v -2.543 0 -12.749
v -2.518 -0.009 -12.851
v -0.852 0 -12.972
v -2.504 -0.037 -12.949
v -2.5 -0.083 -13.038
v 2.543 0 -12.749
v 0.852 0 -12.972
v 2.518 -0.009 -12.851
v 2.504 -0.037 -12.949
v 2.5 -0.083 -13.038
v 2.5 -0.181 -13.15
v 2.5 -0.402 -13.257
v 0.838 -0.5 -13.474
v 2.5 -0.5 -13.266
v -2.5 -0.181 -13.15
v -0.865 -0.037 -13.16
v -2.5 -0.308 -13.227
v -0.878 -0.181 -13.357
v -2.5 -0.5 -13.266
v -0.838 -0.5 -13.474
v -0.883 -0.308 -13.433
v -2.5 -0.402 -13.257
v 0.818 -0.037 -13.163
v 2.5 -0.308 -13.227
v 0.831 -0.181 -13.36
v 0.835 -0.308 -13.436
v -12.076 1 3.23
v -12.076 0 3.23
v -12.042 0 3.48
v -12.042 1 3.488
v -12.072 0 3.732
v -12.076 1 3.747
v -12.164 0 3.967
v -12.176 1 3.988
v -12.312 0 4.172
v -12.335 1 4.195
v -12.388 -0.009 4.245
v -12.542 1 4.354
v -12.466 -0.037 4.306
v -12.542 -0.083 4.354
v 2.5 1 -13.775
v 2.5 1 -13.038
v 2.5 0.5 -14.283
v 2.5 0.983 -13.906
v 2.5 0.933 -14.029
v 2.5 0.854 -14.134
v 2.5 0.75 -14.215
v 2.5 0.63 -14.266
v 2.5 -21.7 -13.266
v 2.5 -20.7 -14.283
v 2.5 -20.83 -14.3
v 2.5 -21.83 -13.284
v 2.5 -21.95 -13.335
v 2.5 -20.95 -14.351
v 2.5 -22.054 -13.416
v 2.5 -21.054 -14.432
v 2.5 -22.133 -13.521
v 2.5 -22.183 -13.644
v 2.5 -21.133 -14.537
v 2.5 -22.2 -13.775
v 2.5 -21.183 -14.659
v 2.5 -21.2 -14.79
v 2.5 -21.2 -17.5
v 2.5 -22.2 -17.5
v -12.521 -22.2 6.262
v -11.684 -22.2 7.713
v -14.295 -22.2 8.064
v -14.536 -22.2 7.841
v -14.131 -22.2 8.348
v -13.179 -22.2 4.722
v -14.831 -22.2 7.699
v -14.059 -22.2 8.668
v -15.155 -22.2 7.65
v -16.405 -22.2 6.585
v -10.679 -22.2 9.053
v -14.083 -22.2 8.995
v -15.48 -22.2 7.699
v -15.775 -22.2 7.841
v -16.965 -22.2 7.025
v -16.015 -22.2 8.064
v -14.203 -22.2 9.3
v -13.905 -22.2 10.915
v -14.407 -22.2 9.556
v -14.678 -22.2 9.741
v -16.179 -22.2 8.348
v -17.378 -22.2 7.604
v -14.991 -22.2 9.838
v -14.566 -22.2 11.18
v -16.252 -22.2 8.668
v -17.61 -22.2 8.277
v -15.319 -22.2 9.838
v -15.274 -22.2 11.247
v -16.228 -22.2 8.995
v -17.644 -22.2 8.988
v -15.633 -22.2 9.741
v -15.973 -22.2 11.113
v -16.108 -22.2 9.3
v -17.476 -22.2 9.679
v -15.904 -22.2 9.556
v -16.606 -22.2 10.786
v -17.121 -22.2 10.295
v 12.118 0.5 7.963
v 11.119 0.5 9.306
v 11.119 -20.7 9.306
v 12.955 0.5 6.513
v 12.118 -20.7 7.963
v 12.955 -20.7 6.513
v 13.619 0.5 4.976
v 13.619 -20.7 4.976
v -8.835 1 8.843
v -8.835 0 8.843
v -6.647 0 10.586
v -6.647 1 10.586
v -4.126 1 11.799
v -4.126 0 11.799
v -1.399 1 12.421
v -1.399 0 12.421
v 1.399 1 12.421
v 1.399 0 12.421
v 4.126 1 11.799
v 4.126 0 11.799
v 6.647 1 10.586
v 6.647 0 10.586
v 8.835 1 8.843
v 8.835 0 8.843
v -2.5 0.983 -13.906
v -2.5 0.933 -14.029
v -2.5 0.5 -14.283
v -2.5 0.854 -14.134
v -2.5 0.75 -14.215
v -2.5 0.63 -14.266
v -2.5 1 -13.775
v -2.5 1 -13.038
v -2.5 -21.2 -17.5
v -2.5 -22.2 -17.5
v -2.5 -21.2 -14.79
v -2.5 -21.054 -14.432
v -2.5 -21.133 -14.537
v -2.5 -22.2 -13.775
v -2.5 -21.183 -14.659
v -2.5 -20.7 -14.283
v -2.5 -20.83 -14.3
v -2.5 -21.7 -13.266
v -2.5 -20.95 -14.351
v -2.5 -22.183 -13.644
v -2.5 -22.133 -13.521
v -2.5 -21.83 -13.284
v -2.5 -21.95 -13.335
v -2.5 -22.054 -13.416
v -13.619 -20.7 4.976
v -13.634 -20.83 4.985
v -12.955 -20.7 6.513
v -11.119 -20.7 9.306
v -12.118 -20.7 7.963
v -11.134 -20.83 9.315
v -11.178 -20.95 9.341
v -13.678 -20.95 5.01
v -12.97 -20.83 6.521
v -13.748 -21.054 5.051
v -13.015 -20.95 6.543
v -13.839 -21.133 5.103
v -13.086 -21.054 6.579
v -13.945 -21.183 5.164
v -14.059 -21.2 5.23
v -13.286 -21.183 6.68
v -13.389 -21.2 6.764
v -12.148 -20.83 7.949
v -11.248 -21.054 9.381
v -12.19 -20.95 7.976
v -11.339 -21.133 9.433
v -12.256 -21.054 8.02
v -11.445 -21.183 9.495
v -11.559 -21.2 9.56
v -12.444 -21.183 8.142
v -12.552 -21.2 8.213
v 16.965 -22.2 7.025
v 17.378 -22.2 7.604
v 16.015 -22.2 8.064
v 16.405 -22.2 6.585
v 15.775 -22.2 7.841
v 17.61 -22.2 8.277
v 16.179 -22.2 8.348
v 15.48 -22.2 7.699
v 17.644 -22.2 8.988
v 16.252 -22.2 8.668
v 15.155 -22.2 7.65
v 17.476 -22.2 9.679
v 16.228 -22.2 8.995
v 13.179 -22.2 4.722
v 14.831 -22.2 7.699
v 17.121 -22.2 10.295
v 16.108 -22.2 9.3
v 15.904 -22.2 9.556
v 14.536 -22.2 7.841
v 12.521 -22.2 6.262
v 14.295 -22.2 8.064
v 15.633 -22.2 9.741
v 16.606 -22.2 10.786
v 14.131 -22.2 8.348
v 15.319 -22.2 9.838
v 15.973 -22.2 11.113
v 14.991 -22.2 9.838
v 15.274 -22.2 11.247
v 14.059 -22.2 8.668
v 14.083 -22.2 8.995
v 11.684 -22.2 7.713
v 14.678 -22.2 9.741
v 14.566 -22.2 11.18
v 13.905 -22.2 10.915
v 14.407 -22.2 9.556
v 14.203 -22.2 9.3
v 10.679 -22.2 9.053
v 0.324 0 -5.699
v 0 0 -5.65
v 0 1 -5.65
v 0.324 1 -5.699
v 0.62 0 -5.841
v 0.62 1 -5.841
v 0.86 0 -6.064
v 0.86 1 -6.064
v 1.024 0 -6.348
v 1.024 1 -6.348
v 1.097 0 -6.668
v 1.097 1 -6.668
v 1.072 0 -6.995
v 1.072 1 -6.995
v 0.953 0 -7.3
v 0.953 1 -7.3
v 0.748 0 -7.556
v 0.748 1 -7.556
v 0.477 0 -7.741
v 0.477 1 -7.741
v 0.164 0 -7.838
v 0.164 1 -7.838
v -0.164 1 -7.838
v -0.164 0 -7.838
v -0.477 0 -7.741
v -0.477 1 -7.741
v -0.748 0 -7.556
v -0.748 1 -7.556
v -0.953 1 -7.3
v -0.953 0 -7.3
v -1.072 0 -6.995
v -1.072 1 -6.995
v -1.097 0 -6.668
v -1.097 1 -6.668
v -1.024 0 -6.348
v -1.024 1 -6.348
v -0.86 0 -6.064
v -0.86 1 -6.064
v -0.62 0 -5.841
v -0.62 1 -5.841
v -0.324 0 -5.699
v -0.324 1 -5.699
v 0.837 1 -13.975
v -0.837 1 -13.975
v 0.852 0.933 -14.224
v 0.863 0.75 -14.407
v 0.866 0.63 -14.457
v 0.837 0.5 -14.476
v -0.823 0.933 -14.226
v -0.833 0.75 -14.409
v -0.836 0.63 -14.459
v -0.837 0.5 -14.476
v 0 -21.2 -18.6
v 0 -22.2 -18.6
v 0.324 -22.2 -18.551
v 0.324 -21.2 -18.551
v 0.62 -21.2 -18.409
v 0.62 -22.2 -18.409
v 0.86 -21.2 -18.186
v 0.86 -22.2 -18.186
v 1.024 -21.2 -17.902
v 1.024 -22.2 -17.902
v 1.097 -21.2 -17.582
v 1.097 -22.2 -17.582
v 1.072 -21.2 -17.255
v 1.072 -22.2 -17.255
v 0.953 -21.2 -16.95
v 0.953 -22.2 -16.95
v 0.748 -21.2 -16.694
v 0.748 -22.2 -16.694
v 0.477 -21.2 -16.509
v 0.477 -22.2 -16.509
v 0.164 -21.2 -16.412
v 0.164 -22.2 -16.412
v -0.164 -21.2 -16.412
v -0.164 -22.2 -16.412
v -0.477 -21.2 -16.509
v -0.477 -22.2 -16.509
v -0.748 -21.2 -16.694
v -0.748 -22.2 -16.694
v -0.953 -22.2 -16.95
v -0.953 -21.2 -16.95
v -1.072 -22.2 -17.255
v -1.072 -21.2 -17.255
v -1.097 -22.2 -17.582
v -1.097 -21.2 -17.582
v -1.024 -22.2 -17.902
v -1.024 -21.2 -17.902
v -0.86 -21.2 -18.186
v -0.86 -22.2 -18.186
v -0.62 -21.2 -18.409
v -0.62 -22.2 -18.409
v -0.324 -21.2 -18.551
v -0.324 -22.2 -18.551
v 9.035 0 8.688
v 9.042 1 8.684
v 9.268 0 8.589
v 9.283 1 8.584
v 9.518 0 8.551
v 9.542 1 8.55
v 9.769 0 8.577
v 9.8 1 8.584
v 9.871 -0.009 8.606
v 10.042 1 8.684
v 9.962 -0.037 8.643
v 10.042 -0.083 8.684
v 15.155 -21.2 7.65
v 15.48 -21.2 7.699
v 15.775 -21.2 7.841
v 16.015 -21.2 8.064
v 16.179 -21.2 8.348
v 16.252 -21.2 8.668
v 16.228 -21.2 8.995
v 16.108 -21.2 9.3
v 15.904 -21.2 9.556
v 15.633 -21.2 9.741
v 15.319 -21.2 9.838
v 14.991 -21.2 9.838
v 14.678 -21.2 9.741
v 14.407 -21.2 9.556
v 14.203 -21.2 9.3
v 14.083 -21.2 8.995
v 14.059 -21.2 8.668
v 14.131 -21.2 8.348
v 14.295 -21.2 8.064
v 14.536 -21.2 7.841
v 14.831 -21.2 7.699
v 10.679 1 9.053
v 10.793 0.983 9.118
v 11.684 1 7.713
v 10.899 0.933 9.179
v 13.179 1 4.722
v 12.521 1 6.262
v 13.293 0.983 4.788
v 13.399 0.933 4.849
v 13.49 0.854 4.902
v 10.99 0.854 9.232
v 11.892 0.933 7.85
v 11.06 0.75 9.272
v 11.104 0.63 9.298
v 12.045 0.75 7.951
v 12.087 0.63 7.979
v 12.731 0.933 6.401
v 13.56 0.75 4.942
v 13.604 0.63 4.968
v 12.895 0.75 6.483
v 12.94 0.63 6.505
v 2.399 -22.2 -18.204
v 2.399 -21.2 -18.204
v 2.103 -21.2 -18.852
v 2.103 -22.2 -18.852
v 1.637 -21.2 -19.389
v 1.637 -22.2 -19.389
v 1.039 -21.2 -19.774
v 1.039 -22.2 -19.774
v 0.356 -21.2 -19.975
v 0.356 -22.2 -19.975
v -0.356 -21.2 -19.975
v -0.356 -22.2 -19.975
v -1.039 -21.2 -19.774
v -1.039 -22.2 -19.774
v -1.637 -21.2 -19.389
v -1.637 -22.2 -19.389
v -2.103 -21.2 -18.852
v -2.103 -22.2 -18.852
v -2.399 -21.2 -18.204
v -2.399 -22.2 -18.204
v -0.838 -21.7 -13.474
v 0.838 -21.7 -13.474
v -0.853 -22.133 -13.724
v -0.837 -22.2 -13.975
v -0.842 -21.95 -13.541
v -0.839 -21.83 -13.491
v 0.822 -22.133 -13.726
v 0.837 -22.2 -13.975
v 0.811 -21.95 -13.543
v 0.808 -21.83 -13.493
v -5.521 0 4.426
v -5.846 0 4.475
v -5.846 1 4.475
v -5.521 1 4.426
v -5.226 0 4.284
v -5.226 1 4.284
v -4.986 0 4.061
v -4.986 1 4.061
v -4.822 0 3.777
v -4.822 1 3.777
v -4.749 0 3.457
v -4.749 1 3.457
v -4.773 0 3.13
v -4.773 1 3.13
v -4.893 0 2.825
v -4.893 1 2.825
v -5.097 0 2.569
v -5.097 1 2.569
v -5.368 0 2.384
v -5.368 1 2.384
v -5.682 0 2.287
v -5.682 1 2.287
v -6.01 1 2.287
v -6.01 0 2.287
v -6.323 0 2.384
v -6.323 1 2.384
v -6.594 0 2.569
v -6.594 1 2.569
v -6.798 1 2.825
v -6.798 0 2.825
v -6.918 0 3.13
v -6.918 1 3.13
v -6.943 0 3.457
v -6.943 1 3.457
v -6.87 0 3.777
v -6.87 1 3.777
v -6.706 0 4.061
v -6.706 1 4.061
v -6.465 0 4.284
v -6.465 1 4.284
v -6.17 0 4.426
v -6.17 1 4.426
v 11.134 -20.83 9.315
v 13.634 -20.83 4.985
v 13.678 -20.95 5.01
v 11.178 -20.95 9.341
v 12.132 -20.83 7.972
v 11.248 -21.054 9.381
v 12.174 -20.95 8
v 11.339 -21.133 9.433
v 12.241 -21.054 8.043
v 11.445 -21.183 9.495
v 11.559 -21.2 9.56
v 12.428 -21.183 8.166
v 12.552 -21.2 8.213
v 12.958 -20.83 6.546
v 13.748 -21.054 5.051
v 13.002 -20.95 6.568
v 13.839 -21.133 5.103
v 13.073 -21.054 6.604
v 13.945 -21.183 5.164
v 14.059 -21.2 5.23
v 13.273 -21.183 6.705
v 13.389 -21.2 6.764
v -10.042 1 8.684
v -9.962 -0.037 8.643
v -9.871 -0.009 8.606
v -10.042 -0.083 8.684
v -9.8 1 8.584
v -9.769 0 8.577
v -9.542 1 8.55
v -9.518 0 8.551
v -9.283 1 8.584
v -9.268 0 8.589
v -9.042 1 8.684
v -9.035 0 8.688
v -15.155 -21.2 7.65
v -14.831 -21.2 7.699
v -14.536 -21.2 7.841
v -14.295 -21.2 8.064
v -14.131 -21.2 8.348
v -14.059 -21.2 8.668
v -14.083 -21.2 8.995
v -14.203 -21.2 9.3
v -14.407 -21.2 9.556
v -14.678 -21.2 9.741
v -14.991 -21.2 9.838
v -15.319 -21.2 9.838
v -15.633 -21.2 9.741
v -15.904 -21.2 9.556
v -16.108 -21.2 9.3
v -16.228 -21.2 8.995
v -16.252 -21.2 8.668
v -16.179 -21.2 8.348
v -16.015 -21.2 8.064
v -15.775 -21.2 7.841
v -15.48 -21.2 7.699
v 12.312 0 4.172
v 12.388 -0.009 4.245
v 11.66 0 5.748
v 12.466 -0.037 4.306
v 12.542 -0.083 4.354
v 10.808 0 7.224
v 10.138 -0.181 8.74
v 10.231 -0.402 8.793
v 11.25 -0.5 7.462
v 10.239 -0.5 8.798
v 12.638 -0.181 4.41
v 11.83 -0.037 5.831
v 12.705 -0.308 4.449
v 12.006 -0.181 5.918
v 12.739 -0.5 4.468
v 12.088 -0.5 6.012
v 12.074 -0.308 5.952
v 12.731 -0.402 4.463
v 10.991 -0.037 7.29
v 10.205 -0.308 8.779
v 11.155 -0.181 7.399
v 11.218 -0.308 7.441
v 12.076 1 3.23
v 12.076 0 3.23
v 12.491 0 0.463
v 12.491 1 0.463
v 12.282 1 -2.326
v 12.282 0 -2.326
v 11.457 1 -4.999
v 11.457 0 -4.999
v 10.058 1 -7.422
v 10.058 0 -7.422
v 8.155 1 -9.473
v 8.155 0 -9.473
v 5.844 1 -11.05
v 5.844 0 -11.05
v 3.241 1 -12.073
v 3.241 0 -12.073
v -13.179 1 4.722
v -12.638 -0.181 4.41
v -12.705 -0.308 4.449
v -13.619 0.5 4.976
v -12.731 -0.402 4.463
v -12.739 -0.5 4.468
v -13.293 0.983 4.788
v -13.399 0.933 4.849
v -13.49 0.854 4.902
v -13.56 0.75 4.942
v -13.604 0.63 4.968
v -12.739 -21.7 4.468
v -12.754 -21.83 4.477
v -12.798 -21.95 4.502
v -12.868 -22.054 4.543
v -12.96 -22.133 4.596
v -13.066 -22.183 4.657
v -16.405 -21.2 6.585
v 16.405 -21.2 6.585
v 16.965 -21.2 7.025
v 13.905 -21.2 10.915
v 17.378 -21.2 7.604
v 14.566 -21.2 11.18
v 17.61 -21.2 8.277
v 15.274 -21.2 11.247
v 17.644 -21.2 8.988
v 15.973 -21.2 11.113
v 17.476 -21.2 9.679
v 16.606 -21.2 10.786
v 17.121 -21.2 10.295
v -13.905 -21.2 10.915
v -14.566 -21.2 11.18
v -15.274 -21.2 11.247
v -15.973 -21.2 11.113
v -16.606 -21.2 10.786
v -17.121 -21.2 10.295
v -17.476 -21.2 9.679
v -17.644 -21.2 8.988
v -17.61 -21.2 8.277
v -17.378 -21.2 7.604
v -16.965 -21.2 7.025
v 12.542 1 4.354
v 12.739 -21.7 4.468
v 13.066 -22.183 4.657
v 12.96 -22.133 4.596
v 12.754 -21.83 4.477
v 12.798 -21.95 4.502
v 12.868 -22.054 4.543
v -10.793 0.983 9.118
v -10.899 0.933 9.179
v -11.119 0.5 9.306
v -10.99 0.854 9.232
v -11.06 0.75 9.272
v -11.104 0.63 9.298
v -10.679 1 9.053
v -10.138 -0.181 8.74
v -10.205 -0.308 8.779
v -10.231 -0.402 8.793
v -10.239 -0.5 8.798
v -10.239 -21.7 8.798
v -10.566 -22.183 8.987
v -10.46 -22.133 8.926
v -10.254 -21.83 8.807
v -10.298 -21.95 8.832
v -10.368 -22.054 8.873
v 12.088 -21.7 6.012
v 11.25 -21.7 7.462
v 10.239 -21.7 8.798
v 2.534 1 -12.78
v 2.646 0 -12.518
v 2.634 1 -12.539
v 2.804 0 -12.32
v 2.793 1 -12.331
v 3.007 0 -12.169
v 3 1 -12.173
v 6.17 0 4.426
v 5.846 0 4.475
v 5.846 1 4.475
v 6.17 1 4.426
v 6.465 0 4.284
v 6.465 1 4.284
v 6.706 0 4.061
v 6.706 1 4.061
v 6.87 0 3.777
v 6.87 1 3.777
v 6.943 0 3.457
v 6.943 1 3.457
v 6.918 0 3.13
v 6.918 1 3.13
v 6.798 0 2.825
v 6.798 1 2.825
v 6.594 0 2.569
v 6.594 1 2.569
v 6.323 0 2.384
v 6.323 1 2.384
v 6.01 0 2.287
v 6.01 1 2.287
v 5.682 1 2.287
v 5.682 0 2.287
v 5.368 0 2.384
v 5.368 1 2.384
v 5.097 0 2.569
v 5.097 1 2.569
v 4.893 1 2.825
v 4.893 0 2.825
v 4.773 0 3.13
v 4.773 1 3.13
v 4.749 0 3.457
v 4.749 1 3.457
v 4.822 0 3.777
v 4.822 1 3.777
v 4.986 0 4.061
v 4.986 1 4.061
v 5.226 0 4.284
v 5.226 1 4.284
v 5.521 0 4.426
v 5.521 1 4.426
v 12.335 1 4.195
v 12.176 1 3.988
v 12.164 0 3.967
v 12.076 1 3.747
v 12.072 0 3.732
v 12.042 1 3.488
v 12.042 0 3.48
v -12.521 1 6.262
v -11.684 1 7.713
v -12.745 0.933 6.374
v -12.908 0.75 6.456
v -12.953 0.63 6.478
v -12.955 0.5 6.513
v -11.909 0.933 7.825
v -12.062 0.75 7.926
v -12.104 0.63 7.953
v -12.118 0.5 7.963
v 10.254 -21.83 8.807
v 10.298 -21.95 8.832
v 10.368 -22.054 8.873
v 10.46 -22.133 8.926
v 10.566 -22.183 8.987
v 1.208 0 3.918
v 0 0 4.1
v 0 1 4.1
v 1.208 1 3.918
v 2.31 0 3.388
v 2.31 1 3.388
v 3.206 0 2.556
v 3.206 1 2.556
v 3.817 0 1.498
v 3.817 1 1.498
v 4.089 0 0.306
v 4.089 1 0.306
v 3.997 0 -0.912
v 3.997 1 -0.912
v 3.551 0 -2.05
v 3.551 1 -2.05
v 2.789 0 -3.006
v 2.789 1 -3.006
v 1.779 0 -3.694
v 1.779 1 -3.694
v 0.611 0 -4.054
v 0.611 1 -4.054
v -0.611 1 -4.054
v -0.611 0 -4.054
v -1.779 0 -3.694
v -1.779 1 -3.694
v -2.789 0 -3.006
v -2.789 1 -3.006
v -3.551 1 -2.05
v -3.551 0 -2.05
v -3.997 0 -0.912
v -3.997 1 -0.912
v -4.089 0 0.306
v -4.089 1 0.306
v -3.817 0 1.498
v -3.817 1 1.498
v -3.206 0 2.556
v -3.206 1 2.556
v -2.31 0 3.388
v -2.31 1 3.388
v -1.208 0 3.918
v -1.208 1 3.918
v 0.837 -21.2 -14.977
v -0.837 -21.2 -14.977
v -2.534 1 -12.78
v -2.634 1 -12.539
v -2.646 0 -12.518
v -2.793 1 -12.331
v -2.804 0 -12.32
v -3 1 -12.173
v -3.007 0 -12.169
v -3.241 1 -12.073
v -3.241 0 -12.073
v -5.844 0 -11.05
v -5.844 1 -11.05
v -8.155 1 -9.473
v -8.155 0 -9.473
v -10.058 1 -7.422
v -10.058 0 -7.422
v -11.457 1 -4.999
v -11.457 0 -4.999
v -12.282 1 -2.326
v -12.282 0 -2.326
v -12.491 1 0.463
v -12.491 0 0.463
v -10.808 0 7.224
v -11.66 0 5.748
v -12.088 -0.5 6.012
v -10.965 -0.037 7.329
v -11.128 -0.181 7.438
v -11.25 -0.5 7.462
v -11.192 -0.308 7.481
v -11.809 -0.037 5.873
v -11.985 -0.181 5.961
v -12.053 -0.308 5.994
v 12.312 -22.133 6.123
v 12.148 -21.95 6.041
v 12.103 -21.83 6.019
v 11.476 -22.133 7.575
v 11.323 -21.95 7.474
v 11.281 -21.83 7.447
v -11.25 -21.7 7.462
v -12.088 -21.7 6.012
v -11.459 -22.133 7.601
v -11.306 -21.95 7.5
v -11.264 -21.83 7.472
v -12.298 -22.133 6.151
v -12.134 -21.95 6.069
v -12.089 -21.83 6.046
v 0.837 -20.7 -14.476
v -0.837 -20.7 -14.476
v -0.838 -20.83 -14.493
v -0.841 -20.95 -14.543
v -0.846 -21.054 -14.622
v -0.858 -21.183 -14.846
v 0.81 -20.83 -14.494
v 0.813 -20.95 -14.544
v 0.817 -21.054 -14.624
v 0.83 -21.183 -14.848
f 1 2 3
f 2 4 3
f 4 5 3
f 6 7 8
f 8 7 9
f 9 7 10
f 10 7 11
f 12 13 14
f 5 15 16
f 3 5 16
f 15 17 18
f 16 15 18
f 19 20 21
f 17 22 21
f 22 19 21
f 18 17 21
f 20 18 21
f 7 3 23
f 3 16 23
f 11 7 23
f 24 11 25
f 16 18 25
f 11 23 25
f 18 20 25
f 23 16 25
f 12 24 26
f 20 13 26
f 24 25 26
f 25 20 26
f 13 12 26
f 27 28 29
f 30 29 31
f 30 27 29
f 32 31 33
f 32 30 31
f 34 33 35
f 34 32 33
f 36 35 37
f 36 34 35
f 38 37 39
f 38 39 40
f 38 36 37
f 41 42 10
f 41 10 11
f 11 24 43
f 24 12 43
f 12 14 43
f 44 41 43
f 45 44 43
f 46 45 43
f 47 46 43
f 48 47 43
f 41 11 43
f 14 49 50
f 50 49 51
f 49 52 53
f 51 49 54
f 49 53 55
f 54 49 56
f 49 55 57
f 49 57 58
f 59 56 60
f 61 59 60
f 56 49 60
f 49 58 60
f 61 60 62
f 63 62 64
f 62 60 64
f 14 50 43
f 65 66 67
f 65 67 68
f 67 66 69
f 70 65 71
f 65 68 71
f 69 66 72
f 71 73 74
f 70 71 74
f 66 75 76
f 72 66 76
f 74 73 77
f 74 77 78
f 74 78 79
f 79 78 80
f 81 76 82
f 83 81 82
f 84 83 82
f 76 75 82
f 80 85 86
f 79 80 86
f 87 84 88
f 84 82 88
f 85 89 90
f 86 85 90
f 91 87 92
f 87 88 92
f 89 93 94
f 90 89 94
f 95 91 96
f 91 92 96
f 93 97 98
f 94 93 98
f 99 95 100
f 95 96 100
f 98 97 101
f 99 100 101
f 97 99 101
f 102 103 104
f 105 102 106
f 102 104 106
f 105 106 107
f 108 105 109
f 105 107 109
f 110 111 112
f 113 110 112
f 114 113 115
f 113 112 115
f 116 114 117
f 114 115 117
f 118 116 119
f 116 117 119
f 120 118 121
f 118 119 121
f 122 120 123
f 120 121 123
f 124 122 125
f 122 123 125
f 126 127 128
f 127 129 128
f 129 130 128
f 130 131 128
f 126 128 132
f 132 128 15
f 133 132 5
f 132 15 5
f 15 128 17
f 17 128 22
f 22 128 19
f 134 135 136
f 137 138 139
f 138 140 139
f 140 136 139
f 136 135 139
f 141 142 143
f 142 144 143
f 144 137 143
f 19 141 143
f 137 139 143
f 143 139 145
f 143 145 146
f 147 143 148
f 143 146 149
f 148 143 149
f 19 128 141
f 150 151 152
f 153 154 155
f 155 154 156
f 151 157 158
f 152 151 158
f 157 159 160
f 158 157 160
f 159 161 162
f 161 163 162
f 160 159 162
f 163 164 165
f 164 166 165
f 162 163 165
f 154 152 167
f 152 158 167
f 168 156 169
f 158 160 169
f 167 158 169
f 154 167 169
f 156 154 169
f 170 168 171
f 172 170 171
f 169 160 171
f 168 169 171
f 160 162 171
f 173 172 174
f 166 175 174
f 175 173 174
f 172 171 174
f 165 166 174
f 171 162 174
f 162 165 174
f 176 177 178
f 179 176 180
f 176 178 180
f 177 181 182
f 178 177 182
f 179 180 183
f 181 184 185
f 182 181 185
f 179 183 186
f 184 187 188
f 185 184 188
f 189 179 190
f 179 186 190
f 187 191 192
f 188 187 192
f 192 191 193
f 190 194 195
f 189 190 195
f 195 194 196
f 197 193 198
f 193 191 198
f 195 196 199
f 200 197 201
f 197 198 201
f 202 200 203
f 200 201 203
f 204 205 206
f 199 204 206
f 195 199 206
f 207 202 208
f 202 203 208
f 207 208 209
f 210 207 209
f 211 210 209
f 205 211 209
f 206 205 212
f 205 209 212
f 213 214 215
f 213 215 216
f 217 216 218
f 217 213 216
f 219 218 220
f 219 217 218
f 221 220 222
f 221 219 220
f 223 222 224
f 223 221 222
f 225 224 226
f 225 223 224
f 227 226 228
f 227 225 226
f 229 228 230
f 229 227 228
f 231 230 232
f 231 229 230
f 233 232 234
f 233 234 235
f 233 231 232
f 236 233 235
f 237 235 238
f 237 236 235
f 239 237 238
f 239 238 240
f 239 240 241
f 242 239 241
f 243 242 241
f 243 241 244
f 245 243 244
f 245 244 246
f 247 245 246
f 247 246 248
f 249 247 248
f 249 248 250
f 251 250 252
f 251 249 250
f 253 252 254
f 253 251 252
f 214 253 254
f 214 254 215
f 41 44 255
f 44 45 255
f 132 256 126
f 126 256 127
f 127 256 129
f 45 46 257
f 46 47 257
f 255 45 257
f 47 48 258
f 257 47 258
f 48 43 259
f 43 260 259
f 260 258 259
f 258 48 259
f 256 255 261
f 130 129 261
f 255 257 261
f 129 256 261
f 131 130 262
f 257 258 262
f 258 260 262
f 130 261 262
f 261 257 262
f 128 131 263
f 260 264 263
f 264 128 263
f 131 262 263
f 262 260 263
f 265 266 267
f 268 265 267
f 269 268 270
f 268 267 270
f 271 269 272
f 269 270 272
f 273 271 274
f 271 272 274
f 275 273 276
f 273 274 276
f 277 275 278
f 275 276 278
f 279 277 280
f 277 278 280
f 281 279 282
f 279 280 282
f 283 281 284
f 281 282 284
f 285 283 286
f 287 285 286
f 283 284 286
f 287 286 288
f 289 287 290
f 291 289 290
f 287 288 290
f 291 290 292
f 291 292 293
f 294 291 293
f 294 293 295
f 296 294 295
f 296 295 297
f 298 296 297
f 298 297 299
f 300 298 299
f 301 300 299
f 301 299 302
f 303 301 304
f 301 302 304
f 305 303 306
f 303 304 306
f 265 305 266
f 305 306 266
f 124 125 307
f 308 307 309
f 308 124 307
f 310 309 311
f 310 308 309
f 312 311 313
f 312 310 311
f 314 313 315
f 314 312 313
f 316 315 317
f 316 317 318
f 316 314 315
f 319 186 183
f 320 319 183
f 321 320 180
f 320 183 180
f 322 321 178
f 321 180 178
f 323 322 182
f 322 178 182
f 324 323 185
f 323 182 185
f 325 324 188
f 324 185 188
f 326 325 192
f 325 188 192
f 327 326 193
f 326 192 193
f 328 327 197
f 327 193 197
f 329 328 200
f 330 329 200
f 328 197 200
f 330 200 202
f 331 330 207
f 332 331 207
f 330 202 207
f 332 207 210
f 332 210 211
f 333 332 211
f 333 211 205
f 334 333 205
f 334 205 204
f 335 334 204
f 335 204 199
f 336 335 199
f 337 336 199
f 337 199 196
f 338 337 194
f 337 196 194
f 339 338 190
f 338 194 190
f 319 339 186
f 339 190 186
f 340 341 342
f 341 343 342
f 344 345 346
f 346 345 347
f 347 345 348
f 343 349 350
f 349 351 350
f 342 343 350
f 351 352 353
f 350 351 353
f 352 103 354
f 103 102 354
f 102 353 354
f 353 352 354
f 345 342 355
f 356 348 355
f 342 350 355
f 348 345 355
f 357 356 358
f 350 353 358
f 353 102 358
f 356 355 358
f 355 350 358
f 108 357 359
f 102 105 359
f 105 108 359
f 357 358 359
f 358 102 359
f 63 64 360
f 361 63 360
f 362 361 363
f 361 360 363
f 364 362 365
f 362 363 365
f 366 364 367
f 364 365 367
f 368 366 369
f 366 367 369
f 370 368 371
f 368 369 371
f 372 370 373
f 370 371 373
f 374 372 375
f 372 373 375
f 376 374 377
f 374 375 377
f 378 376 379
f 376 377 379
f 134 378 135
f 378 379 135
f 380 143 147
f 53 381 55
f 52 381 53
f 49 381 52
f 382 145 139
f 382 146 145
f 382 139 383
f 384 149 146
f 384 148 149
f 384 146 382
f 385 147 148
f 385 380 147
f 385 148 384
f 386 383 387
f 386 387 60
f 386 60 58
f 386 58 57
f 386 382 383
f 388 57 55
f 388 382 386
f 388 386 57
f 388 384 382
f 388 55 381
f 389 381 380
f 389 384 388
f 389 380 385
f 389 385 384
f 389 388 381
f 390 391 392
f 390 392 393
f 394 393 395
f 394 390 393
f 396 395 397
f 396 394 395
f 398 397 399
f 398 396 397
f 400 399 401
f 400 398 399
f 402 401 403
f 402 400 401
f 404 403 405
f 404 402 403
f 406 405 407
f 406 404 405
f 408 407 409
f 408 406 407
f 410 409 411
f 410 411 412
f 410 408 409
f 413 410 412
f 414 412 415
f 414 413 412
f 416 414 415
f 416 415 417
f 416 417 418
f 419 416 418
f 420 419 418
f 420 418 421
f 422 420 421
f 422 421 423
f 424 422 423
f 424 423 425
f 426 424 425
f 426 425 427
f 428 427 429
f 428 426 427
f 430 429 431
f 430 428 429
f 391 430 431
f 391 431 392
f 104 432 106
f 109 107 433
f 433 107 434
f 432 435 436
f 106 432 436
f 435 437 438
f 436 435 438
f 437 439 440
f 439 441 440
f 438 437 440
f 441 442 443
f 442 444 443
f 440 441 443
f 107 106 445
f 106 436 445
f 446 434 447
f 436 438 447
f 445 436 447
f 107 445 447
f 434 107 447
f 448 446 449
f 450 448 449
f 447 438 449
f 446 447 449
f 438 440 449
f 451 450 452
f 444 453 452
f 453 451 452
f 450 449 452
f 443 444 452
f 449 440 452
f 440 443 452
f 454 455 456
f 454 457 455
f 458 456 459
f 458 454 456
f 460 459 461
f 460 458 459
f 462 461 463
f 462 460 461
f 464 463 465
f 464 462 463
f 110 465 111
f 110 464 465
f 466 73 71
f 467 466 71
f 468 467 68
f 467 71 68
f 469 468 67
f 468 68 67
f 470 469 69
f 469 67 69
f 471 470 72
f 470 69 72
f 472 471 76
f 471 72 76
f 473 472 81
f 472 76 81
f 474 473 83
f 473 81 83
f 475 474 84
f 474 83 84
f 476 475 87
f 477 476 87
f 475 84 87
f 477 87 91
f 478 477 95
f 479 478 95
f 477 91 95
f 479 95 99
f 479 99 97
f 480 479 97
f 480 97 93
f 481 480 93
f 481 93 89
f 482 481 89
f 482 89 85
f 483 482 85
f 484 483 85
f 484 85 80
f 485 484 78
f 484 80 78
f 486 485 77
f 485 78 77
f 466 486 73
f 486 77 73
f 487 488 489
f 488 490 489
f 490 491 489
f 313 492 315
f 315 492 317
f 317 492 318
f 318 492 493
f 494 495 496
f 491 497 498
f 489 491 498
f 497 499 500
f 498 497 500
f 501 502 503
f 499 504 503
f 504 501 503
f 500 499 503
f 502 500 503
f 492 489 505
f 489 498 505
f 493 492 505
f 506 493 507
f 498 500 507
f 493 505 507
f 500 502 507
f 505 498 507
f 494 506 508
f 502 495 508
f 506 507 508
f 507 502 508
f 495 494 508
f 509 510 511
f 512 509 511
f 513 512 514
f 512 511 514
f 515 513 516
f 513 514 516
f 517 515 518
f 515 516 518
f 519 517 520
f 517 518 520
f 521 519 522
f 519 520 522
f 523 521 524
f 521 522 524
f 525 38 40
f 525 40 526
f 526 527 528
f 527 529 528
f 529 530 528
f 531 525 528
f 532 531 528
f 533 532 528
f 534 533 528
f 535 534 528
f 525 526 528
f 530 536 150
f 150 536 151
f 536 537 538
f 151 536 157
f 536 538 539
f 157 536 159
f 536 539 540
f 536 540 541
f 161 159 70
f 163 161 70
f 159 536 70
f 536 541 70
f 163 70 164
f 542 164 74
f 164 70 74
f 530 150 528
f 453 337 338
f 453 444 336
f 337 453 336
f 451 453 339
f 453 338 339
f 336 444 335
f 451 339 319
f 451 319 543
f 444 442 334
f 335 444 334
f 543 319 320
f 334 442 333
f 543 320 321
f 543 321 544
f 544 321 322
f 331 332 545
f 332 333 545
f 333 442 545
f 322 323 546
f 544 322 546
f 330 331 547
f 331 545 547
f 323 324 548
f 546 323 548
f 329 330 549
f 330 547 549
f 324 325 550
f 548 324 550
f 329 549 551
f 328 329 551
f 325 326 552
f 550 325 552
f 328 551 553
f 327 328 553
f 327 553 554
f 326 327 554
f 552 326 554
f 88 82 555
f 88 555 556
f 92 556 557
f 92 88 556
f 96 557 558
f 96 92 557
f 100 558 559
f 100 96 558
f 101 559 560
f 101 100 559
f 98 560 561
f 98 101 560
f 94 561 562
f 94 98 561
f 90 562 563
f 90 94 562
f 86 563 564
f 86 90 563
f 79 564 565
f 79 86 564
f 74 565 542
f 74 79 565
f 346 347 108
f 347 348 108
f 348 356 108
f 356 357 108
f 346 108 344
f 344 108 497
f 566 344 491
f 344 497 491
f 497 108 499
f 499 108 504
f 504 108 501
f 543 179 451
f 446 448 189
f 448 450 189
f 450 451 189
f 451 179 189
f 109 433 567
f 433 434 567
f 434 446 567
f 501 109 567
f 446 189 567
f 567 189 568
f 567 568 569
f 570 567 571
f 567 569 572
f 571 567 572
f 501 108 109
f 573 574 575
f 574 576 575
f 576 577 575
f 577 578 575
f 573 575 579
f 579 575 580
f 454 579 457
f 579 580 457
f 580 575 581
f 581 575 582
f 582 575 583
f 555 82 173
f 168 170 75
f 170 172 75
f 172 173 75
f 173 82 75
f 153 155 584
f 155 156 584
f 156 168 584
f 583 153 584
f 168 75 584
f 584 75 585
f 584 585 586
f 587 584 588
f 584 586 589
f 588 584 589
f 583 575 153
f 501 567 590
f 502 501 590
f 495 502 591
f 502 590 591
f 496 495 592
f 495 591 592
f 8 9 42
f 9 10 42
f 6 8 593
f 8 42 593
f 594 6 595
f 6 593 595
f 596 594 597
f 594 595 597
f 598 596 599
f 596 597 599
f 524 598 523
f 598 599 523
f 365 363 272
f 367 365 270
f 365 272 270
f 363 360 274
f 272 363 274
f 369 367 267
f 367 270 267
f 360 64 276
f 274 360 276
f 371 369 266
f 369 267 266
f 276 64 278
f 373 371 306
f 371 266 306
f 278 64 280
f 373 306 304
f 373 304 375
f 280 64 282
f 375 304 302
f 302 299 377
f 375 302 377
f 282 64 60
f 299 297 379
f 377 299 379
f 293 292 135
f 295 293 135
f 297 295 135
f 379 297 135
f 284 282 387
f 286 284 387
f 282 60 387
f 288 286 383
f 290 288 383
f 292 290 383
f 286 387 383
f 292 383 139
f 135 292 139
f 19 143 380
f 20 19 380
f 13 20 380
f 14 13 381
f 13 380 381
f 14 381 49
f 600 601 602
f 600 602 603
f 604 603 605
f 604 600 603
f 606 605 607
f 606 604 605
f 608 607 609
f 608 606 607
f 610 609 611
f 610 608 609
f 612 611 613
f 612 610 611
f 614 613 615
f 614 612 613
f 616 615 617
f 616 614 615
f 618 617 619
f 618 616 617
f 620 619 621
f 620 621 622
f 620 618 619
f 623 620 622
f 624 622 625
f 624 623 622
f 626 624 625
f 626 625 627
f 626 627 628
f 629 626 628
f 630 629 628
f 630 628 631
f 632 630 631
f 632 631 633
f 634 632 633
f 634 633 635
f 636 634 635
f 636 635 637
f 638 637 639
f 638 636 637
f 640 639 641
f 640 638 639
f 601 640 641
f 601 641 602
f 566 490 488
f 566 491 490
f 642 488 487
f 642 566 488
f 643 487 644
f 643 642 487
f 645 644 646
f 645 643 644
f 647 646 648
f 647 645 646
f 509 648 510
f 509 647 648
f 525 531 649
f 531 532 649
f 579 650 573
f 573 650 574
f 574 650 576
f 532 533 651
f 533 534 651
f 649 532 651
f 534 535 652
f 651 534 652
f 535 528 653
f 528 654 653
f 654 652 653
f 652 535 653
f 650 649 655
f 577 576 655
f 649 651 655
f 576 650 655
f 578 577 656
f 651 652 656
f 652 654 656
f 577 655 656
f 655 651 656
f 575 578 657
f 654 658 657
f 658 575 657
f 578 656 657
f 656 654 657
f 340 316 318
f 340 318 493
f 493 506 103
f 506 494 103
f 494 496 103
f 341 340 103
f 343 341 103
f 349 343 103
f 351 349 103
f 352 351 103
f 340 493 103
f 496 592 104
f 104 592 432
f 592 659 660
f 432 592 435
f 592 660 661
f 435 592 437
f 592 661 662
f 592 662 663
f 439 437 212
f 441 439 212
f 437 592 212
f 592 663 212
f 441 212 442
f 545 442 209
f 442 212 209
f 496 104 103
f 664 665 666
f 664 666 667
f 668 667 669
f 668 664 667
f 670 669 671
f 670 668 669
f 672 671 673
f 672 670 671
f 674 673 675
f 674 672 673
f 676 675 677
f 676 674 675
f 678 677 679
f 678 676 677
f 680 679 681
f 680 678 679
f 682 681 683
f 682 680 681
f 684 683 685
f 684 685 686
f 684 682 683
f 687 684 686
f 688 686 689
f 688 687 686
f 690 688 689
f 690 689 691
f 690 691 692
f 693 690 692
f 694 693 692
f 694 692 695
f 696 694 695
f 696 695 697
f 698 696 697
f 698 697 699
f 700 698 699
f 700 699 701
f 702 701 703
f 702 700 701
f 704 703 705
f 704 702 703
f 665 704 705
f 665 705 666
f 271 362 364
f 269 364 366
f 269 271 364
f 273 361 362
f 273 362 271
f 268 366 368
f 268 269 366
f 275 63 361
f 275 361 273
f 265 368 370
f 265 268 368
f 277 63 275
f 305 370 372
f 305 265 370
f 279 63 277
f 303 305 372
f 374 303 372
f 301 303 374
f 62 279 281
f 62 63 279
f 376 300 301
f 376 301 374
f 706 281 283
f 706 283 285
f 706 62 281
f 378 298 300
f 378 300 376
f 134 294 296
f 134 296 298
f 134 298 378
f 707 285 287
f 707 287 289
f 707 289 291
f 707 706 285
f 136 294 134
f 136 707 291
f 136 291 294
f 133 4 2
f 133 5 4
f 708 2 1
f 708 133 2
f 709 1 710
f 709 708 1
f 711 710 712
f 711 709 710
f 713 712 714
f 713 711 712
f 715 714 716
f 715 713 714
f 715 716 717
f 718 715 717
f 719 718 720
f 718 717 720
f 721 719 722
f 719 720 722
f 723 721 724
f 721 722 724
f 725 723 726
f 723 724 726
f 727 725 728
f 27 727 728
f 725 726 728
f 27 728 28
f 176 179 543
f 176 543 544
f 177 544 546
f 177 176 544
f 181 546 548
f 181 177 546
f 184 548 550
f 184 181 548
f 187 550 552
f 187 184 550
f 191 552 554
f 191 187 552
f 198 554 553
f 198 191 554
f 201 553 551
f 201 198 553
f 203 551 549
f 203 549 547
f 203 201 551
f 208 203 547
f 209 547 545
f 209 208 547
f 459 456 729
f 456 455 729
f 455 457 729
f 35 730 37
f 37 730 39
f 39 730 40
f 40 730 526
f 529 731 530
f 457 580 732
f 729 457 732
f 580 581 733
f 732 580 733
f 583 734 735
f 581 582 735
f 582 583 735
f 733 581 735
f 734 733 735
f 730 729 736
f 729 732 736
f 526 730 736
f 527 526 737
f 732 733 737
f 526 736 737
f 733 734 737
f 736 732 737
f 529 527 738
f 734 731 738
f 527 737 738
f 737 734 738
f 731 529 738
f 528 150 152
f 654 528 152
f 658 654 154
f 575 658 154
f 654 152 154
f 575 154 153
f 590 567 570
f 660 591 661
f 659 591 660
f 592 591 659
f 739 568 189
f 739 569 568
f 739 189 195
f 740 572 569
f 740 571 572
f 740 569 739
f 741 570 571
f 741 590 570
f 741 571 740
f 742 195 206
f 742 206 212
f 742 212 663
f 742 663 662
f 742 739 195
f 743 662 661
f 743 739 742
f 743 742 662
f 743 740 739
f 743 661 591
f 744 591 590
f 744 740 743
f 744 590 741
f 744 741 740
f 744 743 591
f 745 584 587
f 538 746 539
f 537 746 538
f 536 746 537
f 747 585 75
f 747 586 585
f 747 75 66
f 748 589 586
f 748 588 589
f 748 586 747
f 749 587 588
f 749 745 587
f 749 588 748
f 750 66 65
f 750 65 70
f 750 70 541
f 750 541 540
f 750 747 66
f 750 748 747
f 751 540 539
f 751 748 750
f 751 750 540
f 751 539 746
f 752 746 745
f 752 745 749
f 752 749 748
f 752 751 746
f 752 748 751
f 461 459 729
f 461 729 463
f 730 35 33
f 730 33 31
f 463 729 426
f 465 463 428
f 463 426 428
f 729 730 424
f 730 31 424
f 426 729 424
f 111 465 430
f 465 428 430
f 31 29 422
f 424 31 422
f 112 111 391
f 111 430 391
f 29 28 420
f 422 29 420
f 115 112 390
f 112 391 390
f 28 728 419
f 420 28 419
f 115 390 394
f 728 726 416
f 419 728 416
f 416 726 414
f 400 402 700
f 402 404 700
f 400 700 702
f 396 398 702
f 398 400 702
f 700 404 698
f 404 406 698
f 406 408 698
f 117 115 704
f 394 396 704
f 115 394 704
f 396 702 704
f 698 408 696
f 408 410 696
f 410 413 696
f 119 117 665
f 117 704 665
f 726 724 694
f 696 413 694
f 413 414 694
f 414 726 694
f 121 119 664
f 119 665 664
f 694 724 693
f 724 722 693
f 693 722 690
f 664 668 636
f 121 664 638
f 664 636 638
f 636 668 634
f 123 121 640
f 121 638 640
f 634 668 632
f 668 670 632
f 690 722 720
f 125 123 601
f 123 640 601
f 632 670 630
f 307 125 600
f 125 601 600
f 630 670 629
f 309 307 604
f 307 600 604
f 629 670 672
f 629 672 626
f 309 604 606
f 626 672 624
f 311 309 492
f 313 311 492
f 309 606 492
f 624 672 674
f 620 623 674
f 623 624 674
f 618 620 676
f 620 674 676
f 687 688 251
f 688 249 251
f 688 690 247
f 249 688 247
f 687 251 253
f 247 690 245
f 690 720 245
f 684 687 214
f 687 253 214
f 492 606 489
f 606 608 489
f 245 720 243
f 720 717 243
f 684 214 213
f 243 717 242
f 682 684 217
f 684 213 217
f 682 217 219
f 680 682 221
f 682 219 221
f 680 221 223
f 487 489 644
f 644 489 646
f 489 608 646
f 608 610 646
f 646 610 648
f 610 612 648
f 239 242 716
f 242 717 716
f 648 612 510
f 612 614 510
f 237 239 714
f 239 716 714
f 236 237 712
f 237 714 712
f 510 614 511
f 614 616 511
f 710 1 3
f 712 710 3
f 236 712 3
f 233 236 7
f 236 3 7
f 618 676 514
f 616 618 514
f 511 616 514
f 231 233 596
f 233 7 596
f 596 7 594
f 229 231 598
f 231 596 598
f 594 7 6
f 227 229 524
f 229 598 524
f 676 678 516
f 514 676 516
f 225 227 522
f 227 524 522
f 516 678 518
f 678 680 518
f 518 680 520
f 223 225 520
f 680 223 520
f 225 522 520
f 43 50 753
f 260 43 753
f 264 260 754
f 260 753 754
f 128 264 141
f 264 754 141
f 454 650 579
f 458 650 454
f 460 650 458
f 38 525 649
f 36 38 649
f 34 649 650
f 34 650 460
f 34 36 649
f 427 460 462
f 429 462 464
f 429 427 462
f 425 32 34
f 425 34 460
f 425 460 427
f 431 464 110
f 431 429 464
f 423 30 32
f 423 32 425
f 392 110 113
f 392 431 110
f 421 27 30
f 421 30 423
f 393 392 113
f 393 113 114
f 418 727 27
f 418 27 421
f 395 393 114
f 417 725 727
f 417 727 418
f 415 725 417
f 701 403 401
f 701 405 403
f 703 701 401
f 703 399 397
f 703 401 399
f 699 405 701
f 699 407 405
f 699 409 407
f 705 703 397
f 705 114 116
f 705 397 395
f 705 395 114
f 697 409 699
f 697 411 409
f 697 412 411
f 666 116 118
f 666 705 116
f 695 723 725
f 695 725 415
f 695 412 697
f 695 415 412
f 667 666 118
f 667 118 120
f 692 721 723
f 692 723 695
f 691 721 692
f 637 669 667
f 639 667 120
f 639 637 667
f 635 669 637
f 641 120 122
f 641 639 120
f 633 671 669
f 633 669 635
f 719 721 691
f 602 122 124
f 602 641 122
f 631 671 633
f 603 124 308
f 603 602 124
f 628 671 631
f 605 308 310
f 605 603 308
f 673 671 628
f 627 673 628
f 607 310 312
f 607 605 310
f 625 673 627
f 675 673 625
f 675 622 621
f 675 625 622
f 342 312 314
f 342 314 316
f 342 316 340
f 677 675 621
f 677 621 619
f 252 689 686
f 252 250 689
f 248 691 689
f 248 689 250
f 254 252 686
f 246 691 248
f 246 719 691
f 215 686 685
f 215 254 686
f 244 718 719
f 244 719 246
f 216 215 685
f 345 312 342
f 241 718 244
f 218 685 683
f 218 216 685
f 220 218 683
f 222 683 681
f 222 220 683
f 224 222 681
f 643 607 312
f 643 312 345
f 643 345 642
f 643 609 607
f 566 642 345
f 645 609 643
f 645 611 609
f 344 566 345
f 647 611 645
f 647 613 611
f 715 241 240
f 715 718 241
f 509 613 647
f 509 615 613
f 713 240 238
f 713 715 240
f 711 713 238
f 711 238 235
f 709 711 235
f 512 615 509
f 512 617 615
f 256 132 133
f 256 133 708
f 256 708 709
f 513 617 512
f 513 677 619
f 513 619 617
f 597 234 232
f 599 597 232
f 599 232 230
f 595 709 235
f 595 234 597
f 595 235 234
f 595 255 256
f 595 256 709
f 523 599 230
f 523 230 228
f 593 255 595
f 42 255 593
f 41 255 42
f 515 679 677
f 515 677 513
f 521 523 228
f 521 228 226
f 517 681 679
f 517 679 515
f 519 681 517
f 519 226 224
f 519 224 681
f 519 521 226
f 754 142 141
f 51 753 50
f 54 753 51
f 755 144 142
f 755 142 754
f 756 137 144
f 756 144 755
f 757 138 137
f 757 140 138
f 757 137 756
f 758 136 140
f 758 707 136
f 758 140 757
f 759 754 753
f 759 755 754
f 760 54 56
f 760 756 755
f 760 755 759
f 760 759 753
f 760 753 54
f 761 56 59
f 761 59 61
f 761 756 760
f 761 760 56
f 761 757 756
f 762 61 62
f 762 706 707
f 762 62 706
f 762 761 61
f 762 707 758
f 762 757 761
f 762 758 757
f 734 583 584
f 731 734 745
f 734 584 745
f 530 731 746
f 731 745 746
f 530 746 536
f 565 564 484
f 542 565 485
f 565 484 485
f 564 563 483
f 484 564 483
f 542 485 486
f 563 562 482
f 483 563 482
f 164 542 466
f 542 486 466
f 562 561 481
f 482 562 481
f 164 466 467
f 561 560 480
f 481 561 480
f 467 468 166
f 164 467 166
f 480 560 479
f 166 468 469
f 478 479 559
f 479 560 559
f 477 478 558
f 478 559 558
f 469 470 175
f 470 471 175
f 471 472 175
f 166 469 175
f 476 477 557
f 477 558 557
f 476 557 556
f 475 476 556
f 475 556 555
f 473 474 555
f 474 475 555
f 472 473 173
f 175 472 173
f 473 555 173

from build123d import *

# Parameters (mm, degrees)
ESBO_O1_R                = 4.1
ESBO_O1_R_2              = 1.099999999999999
ESBO_O1_R_3              = 1.1000000000000312
ESBO_O1_R_4              = 1.1000000000000612
RESSALTO_EXTRUS_O1_DEPTH = 1
RESSALTO_EXTRUS_O2_START = 22.2
RESSALTO_EXTRUS_O2_DEPTH = 22.2
ESBO_O3_R                = 1.1
ESBO_O3_R_2              = 1.100000000000001
ESBO_O3_R_3              = 1.0999999999999976
RESSALTO_EXTRUS_O3_DEPTH = 1
FILETE1_R                = 1
FILETE2_R                = 0.5
FILETE3_R                = 0.5
FILETE4_R                = 0.5
FILETE5_R                = 0.5


with BuildPart() as part:
    # Esboço1 → Ressalto-extrusão1 (new body)
    with BuildSketch(Plane(origin=(0, 0, 0), x_dir=(1, 0, 0), z_dir=(0, 1, 0))):
        with BuildLine():
            Line((-2.5000000000000018, 14.2828568570857), (-2.5000000000000004, 12.24744871391589))
            ThreePointArc((-2.5000000000000004, 12.24744871391589), (-10.825317547305453, 6.250000000000052), (-11.856601717798243, -3.9586608474967395))
            Line((-11.856601717798243, -3.9586608474967395), (-13.619316876853024, -4.976364919081628))
            ThreePointArc((-13.619316876853024, -4.976364919081628), (-12.557368354874425, -7.249999999999881), (-11.119316876853064, -9.306491938003845))
            Line((-11.119316876853064, -9.306491938003845), (-9.356601717798284, -8.288787866418957))
            ThreePointArc((-9.356601717798284, -8.288787866418957), (-8.528e-14, -12.499999999999996), (9.356601717798178, -8.288787866419089))
            Line((9.356601717798178, -8.288787866419089), (11.119316876852942, -9.306491938004001))
            ThreePointArc((11.119316876852942, -9.306491938004001), (12.55736835487433, -7.250000000000061), (13.619316876852963, -4.976364919081819))
            Line((13.619316876852963, -4.976364919081819), (11.856601717798197, -3.958660847496907))
            ThreePointArc((11.856601717798197, -3.958660847496907), (10.8253175473055, 6.249999999999976), (2.499999999999998, 12.24744871391589))
            Line((2.499999999999998, 12.24744871391589), (2.4999999999999982, 14.2828568570857))
            ThreePointArc((2.4999999999999982, 14.2828568570857), (8.9e-16, 14.5), (-2.5000000000000018, 14.2828568570857))
        make_face()
        with Locations(Location((0, 0, 0), (0, 0, 270))):
            Circle(ESBO_O1_R, mode=Mode.SUBTRACT)
        with Locations(Location((0, 6.750000000000001, 0), (0, 0, 270))):
            Circle(ESBO_O1_R_2, mode=Mode.SUBTRACT)
        with Locations(Location((5.845671475544961, -3.374999999999999, 0), (0, 0, 270))):
            Circle(ESBO_O1_R_3, mode=Mode.SUBTRACT)
        with Locations(Location((-5.84567147554496, -3.3750000000000036, 0), (0, 0, 270))):
            Circle(ESBO_O1_R_4, mode=Mode.SUBTRACT)
    extrude(amount=RESSALTO_EXTRUS_O1_DEPTH)

    # Esboço2 → Ressalto-extrusão2 (add)
    with BuildSketch(Plane.XZ.offset(RESSALTO_EXTRUS_O2_START)):
        with BuildLine():
            Line((-11.11931687685307, 9.30649193800384), (-10.239125293076137, 8.798313090171801))
            ThreePointArc((-10.239125293076137, 8.798313090171801), (-11.691342951089984, 6.74999999999989), (-12.739125293076098, 4.4681860712495824))
            Line((-12.739125293076098, 4.4681860712495824), (-13.619316876853024, 4.976364919081628))
            ThreePointArc((-13.619316876853024, 4.976364919081628), (-12.557368354874427, 7.249999999999882), (-11.11931687685307, 9.30649193800384))
        make_face()
        with BuildLine():
            Line((-2.5000000000000018, -14.2828568570857), (-2.5000000000000013, -13.266499161421601))
            ThreePointArc((-2.5000000000000013, -13.266499161421601), (-2.17e-15, -13.500000000000002), (2.499999999999998, -13.266499161421601))
            Line((2.499999999999998, -13.266499161421601), (2.4999999999999982, -14.2828568570857))
            ThreePointArc((2.4999999999999982, -14.2828568570857), (8.9e-16, -14.500000000000002), (-2.5000000000000018, -14.2828568570857))
        make_face()
        with BuildLine():
            Line((13.619316876852963, 4.976364919081819), (12.739125293076041, 4.468186071249766))
            ThreePointArc((12.739125293076041, 4.468186071249766), (11.691342951089894, 6.750000000000058), (10.239125293076022, 8.798313090171948))
            Line((10.239125293076022, 8.798313090171948), (11.119316876852942, 9.306491938004001))
            ThreePointArc((11.119316876852942, 9.306491938004001), (12.557368354874331, 7.250000000000062), (13.619316876852963, 4.976364919081819))
        make_face()
    extrude(amount=-RESSALTO_EXTRUS_O2_DEPTH)

    # Esboço3 → Ressalto-extrusão3 (add)
    # profile 1 of 3: a face of its own
    with BuildSketch(Plane.XZ.offset(22.2)):
        with BuildLine():
            Line((2.4999999999999982, -14.2828568570857), (2.4999999999999982, -17.5))
            ThreePointArc((2.4999999999999982, -17.5), (-1.99e-15, -20), (-2.500000000000002, -17.5))
            Line((-2.500000000000002, -17.5), (-2.5000000000000018, -14.2828568570857))
            ThreePointArc((-2.5000000000000018, -14.2828568570857), (8.9e-16, -14.500000000000002), (2.4999999999999982, -14.2828568570857))
        make_face()
        with Locations(Location((-1.53e-15, -17.5, 0), (0, 0, 270))):
            Circle(ESBO_O3_R, mode=Mode.SUBTRACT)
    # profile 2 of 3: a face of its own
    with BuildSketch(Plane.XZ.offset(22.2)):
        with BuildLine():
            Line((-11.11931687685294, 9.306491938004003), (-13.905444566227628, 10.915063509461165))
            ThreePointArc((-13.905444566227628, 10.915063509461165), (-17.320508075688732, 10.000000000000085), (-16.40544456622765, 6.584936490538983))
            Line((-16.40544456622765, 6.584936490538983), (-13.619316876852961, 4.97636491908182))
            ThreePointArc((-13.619316876852961, 4.97636491908182), (-12.55736835487433, 7.250000000000063), (-11.11931687685294, 9.306491938004003))
        make_face()
        with Locations(Location((-15.15544456622764, 8.750000000000073, 0), (0, 0, 270))):
            Circle(ESBO_O3_R_2, mode=Mode.SUBTRACT)
    # profile 3 of 3: a face of its own
    with BuildSketch(Plane.XZ.offset(22.2)):
        with BuildLine():
            Line((13.619316876853029, 4.976364919081625), (16.40544456622774, 6.58493649053875))
            ThreePointArc((16.40544456622774, 6.58493649053875), (17.320508075688867, 9.999999999999838), (13.905444566227779, 10.915063509460968))
            Line((13.905444566227779, 10.915063509460968), (11.11931687685307, 9.306491938003841))
            ThreePointArc((11.11931687685307, 9.306491938003841), (12.557368354874429, 7.249999999999881), (13.619316876853029, 4.976364919081625))
        make_face()
        with Locations(Location((15.155444566227757, 8.749999999999858, 0), (0, 0, 270))):
            Circle(ESBO_O3_R_3, mode=Mode.SUBTRACT)
    extrude(amount=-RESSALTO_EXTRUS_O3_DEPTH)

    # Filete1
    filete1_edges = [part.edges().sort_by_distance(p)[0] for p in [
        (11.856601717798199, 0.5, 3.9586608474969074),
        (2.4999999999999982, 0.5, -12.24744871391589),
        (-2.5000000000000004, 0.5, -12.24744871391589),
        (-11.856601717798242, 0.5, 3.9586608474967386),
        (9.356601717798178, 0.5, 8.288787866419089),
        (-9.356601717798284, 0.5, 8.288787866418957),
    ]]
    fillet(filete1_edges, radius=FILETE1_R)

    # Filete2
    filete2_edges = [part.edges().sort_by_distance(p)[0] for p in [
        (-12.557368354874423, 1, 7.2499999999998845),
        (12.557368354874328, 1, 7.250000000000058),
        (-2.33e-15, 1, -14.5),
    ]]
    fillet(filete2_edges, radius=FILETE2_R)

    # Filete3
    filete3_edges = [part.edges().sort_by_distance(p)[0] for p in [
        (-1.67e-15, 0, -13.499999999999998),
        (11.691342951089894, 0, 6.750000000000058),
        (-11.691342951089982, 0, 6.749999999999892),
    ]]
    fillet(filete3_edges, radius=FILETE3_R)

    # Filete4
    filete4_edges = [part.edges().sort_by_distance(p)[0] for p in [
        (-12.557368354874328, -21.2, 7.250000000000062),
        (12.55736835487443, -21.2, 7.249999999999882),
        (-1.67e-15, -21.2, -14.500000000000004),
    ]]
    fillet(filete4_edges, radius=FILETE4_R)

    # Filete5
    filete5_edges = [part.edges().sort_by_distance(p)[0] for p in [
        (-1.67e-15, -22.2, -13.499999999999998),
        (-11.691342951089982, -22.2, 6.749999999999892),
        (11.691342951089894, -22.2, 6.750000000000058),
    ]]
    fillet(filete5_edges, radius=FILETE5_R)


solid = part.part
